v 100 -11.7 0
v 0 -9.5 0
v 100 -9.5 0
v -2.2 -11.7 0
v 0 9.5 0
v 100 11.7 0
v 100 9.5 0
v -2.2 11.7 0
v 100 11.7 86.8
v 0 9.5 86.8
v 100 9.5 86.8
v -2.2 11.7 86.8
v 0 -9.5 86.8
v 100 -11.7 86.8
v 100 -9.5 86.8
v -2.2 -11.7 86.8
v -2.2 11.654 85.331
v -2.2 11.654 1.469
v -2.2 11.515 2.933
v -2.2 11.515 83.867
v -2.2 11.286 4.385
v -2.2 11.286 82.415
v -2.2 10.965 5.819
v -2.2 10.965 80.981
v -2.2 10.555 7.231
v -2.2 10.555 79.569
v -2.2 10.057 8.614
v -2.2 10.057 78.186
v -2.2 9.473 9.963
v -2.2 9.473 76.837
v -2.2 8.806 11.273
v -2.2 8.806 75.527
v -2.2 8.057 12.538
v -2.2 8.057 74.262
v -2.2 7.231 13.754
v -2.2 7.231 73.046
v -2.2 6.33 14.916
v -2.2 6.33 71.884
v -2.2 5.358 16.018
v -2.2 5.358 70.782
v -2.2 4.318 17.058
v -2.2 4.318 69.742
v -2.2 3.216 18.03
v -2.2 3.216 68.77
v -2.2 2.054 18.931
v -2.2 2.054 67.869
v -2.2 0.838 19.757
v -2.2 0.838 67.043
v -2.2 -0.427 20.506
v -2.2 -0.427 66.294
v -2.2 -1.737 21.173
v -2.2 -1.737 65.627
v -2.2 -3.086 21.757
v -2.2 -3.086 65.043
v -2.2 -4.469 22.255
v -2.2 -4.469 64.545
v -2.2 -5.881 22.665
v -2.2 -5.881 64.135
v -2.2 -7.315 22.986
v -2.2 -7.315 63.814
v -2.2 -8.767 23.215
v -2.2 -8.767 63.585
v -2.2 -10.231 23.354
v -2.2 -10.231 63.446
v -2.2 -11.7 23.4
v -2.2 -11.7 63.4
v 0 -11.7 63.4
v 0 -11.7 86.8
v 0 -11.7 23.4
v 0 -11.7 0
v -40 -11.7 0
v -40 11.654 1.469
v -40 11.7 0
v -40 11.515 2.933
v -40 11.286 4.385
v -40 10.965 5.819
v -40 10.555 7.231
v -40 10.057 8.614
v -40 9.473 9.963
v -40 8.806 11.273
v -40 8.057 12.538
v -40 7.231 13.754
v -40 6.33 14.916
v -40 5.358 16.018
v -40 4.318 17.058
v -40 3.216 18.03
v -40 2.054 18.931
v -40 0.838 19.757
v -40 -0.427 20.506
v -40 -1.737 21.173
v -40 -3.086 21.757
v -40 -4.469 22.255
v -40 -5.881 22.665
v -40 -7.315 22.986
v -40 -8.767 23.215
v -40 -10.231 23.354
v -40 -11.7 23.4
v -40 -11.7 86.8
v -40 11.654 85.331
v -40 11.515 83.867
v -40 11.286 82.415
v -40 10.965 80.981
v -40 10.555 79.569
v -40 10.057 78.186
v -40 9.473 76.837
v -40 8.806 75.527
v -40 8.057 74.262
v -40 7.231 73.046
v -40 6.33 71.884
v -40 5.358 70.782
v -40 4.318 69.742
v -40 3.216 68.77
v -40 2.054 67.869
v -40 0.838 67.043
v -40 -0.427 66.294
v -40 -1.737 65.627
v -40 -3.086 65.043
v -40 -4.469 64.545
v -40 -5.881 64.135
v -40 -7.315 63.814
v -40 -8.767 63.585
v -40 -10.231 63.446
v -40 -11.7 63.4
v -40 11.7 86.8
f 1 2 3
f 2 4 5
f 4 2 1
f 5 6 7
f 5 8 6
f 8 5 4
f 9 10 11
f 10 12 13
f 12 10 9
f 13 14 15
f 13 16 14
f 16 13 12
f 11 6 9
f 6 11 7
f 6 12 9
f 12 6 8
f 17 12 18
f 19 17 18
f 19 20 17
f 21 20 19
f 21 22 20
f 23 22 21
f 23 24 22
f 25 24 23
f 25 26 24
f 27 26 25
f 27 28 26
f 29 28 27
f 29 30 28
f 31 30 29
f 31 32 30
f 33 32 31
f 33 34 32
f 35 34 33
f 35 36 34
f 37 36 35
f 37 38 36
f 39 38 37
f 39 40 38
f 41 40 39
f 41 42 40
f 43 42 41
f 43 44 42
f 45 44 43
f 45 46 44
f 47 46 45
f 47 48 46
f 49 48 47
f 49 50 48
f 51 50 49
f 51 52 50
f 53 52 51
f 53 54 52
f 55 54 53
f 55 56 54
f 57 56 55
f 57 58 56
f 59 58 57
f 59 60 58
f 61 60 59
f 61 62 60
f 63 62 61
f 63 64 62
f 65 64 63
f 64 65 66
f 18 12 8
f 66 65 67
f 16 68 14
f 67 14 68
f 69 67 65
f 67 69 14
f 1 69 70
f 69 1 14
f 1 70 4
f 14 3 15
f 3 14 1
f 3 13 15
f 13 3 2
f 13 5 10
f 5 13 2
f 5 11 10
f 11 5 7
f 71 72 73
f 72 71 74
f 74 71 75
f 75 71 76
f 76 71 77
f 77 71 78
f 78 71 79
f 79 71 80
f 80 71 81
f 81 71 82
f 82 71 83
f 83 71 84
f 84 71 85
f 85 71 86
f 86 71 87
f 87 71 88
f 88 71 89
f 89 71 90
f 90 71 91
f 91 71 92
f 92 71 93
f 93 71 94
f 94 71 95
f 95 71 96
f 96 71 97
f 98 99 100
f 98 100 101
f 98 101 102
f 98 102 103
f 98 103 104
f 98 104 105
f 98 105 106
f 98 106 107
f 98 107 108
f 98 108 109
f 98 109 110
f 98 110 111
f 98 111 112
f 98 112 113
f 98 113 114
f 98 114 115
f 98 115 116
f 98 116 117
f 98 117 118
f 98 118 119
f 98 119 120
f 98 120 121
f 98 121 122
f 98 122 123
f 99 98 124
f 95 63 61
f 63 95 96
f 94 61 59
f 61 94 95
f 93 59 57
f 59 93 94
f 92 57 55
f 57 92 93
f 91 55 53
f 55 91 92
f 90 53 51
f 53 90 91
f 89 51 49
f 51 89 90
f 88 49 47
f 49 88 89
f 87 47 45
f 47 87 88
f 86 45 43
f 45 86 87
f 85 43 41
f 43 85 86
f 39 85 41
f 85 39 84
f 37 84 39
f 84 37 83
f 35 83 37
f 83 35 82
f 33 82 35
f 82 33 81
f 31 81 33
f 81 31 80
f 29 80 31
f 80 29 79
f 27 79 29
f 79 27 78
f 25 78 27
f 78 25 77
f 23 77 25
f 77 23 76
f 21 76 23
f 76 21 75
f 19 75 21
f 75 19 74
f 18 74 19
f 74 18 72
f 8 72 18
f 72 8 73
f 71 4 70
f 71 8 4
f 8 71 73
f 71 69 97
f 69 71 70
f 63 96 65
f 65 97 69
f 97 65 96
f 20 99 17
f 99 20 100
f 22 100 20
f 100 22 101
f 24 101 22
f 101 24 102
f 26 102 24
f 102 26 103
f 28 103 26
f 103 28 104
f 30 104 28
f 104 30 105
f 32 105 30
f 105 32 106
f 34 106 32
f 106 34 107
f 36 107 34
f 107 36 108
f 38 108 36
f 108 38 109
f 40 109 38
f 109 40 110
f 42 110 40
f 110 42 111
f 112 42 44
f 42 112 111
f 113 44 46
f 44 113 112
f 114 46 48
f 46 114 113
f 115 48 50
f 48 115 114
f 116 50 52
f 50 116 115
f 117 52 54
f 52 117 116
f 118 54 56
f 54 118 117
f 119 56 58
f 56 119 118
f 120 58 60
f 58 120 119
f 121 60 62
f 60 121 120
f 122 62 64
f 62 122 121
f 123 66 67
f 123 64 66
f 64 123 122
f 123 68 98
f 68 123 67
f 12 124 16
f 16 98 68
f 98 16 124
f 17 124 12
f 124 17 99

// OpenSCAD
shelf_thickness = 19;
slit_width = 40;
length = 40;
depth = 100;
thickness = 2.2;

total_height = shelf_thickness + 2*thickness;
total_length = length + depth;
total_width = slit_width + 2*total_height;
hook_radius = total_height;

module h1() {
  translate([0, shelf_thickness / 2]) {
    square([depth, thickness]);
  }
}

linear_extrude(height = total_width) {
  translate([0, -total_height / 2]) rotate(90) square([total_height, thickness]);
  h1();
  mirror([0, 1, 0]) h1();
}

module h2() {
  translate([0, -(hook_radius + slit_width/2)]) {
    intersection() {
      circle(r = hook_radius, $fn = 100);
      square([hook_radius, hook_radius]);
    }
  }
}

translate([0, -total_height/2, total_width/2]) {
  rotate([270, 0, 90]) {
    linear_extrude(height = length) {
      mirror([0, 1, 0]) h2();
      h2();
    }
  }
}
